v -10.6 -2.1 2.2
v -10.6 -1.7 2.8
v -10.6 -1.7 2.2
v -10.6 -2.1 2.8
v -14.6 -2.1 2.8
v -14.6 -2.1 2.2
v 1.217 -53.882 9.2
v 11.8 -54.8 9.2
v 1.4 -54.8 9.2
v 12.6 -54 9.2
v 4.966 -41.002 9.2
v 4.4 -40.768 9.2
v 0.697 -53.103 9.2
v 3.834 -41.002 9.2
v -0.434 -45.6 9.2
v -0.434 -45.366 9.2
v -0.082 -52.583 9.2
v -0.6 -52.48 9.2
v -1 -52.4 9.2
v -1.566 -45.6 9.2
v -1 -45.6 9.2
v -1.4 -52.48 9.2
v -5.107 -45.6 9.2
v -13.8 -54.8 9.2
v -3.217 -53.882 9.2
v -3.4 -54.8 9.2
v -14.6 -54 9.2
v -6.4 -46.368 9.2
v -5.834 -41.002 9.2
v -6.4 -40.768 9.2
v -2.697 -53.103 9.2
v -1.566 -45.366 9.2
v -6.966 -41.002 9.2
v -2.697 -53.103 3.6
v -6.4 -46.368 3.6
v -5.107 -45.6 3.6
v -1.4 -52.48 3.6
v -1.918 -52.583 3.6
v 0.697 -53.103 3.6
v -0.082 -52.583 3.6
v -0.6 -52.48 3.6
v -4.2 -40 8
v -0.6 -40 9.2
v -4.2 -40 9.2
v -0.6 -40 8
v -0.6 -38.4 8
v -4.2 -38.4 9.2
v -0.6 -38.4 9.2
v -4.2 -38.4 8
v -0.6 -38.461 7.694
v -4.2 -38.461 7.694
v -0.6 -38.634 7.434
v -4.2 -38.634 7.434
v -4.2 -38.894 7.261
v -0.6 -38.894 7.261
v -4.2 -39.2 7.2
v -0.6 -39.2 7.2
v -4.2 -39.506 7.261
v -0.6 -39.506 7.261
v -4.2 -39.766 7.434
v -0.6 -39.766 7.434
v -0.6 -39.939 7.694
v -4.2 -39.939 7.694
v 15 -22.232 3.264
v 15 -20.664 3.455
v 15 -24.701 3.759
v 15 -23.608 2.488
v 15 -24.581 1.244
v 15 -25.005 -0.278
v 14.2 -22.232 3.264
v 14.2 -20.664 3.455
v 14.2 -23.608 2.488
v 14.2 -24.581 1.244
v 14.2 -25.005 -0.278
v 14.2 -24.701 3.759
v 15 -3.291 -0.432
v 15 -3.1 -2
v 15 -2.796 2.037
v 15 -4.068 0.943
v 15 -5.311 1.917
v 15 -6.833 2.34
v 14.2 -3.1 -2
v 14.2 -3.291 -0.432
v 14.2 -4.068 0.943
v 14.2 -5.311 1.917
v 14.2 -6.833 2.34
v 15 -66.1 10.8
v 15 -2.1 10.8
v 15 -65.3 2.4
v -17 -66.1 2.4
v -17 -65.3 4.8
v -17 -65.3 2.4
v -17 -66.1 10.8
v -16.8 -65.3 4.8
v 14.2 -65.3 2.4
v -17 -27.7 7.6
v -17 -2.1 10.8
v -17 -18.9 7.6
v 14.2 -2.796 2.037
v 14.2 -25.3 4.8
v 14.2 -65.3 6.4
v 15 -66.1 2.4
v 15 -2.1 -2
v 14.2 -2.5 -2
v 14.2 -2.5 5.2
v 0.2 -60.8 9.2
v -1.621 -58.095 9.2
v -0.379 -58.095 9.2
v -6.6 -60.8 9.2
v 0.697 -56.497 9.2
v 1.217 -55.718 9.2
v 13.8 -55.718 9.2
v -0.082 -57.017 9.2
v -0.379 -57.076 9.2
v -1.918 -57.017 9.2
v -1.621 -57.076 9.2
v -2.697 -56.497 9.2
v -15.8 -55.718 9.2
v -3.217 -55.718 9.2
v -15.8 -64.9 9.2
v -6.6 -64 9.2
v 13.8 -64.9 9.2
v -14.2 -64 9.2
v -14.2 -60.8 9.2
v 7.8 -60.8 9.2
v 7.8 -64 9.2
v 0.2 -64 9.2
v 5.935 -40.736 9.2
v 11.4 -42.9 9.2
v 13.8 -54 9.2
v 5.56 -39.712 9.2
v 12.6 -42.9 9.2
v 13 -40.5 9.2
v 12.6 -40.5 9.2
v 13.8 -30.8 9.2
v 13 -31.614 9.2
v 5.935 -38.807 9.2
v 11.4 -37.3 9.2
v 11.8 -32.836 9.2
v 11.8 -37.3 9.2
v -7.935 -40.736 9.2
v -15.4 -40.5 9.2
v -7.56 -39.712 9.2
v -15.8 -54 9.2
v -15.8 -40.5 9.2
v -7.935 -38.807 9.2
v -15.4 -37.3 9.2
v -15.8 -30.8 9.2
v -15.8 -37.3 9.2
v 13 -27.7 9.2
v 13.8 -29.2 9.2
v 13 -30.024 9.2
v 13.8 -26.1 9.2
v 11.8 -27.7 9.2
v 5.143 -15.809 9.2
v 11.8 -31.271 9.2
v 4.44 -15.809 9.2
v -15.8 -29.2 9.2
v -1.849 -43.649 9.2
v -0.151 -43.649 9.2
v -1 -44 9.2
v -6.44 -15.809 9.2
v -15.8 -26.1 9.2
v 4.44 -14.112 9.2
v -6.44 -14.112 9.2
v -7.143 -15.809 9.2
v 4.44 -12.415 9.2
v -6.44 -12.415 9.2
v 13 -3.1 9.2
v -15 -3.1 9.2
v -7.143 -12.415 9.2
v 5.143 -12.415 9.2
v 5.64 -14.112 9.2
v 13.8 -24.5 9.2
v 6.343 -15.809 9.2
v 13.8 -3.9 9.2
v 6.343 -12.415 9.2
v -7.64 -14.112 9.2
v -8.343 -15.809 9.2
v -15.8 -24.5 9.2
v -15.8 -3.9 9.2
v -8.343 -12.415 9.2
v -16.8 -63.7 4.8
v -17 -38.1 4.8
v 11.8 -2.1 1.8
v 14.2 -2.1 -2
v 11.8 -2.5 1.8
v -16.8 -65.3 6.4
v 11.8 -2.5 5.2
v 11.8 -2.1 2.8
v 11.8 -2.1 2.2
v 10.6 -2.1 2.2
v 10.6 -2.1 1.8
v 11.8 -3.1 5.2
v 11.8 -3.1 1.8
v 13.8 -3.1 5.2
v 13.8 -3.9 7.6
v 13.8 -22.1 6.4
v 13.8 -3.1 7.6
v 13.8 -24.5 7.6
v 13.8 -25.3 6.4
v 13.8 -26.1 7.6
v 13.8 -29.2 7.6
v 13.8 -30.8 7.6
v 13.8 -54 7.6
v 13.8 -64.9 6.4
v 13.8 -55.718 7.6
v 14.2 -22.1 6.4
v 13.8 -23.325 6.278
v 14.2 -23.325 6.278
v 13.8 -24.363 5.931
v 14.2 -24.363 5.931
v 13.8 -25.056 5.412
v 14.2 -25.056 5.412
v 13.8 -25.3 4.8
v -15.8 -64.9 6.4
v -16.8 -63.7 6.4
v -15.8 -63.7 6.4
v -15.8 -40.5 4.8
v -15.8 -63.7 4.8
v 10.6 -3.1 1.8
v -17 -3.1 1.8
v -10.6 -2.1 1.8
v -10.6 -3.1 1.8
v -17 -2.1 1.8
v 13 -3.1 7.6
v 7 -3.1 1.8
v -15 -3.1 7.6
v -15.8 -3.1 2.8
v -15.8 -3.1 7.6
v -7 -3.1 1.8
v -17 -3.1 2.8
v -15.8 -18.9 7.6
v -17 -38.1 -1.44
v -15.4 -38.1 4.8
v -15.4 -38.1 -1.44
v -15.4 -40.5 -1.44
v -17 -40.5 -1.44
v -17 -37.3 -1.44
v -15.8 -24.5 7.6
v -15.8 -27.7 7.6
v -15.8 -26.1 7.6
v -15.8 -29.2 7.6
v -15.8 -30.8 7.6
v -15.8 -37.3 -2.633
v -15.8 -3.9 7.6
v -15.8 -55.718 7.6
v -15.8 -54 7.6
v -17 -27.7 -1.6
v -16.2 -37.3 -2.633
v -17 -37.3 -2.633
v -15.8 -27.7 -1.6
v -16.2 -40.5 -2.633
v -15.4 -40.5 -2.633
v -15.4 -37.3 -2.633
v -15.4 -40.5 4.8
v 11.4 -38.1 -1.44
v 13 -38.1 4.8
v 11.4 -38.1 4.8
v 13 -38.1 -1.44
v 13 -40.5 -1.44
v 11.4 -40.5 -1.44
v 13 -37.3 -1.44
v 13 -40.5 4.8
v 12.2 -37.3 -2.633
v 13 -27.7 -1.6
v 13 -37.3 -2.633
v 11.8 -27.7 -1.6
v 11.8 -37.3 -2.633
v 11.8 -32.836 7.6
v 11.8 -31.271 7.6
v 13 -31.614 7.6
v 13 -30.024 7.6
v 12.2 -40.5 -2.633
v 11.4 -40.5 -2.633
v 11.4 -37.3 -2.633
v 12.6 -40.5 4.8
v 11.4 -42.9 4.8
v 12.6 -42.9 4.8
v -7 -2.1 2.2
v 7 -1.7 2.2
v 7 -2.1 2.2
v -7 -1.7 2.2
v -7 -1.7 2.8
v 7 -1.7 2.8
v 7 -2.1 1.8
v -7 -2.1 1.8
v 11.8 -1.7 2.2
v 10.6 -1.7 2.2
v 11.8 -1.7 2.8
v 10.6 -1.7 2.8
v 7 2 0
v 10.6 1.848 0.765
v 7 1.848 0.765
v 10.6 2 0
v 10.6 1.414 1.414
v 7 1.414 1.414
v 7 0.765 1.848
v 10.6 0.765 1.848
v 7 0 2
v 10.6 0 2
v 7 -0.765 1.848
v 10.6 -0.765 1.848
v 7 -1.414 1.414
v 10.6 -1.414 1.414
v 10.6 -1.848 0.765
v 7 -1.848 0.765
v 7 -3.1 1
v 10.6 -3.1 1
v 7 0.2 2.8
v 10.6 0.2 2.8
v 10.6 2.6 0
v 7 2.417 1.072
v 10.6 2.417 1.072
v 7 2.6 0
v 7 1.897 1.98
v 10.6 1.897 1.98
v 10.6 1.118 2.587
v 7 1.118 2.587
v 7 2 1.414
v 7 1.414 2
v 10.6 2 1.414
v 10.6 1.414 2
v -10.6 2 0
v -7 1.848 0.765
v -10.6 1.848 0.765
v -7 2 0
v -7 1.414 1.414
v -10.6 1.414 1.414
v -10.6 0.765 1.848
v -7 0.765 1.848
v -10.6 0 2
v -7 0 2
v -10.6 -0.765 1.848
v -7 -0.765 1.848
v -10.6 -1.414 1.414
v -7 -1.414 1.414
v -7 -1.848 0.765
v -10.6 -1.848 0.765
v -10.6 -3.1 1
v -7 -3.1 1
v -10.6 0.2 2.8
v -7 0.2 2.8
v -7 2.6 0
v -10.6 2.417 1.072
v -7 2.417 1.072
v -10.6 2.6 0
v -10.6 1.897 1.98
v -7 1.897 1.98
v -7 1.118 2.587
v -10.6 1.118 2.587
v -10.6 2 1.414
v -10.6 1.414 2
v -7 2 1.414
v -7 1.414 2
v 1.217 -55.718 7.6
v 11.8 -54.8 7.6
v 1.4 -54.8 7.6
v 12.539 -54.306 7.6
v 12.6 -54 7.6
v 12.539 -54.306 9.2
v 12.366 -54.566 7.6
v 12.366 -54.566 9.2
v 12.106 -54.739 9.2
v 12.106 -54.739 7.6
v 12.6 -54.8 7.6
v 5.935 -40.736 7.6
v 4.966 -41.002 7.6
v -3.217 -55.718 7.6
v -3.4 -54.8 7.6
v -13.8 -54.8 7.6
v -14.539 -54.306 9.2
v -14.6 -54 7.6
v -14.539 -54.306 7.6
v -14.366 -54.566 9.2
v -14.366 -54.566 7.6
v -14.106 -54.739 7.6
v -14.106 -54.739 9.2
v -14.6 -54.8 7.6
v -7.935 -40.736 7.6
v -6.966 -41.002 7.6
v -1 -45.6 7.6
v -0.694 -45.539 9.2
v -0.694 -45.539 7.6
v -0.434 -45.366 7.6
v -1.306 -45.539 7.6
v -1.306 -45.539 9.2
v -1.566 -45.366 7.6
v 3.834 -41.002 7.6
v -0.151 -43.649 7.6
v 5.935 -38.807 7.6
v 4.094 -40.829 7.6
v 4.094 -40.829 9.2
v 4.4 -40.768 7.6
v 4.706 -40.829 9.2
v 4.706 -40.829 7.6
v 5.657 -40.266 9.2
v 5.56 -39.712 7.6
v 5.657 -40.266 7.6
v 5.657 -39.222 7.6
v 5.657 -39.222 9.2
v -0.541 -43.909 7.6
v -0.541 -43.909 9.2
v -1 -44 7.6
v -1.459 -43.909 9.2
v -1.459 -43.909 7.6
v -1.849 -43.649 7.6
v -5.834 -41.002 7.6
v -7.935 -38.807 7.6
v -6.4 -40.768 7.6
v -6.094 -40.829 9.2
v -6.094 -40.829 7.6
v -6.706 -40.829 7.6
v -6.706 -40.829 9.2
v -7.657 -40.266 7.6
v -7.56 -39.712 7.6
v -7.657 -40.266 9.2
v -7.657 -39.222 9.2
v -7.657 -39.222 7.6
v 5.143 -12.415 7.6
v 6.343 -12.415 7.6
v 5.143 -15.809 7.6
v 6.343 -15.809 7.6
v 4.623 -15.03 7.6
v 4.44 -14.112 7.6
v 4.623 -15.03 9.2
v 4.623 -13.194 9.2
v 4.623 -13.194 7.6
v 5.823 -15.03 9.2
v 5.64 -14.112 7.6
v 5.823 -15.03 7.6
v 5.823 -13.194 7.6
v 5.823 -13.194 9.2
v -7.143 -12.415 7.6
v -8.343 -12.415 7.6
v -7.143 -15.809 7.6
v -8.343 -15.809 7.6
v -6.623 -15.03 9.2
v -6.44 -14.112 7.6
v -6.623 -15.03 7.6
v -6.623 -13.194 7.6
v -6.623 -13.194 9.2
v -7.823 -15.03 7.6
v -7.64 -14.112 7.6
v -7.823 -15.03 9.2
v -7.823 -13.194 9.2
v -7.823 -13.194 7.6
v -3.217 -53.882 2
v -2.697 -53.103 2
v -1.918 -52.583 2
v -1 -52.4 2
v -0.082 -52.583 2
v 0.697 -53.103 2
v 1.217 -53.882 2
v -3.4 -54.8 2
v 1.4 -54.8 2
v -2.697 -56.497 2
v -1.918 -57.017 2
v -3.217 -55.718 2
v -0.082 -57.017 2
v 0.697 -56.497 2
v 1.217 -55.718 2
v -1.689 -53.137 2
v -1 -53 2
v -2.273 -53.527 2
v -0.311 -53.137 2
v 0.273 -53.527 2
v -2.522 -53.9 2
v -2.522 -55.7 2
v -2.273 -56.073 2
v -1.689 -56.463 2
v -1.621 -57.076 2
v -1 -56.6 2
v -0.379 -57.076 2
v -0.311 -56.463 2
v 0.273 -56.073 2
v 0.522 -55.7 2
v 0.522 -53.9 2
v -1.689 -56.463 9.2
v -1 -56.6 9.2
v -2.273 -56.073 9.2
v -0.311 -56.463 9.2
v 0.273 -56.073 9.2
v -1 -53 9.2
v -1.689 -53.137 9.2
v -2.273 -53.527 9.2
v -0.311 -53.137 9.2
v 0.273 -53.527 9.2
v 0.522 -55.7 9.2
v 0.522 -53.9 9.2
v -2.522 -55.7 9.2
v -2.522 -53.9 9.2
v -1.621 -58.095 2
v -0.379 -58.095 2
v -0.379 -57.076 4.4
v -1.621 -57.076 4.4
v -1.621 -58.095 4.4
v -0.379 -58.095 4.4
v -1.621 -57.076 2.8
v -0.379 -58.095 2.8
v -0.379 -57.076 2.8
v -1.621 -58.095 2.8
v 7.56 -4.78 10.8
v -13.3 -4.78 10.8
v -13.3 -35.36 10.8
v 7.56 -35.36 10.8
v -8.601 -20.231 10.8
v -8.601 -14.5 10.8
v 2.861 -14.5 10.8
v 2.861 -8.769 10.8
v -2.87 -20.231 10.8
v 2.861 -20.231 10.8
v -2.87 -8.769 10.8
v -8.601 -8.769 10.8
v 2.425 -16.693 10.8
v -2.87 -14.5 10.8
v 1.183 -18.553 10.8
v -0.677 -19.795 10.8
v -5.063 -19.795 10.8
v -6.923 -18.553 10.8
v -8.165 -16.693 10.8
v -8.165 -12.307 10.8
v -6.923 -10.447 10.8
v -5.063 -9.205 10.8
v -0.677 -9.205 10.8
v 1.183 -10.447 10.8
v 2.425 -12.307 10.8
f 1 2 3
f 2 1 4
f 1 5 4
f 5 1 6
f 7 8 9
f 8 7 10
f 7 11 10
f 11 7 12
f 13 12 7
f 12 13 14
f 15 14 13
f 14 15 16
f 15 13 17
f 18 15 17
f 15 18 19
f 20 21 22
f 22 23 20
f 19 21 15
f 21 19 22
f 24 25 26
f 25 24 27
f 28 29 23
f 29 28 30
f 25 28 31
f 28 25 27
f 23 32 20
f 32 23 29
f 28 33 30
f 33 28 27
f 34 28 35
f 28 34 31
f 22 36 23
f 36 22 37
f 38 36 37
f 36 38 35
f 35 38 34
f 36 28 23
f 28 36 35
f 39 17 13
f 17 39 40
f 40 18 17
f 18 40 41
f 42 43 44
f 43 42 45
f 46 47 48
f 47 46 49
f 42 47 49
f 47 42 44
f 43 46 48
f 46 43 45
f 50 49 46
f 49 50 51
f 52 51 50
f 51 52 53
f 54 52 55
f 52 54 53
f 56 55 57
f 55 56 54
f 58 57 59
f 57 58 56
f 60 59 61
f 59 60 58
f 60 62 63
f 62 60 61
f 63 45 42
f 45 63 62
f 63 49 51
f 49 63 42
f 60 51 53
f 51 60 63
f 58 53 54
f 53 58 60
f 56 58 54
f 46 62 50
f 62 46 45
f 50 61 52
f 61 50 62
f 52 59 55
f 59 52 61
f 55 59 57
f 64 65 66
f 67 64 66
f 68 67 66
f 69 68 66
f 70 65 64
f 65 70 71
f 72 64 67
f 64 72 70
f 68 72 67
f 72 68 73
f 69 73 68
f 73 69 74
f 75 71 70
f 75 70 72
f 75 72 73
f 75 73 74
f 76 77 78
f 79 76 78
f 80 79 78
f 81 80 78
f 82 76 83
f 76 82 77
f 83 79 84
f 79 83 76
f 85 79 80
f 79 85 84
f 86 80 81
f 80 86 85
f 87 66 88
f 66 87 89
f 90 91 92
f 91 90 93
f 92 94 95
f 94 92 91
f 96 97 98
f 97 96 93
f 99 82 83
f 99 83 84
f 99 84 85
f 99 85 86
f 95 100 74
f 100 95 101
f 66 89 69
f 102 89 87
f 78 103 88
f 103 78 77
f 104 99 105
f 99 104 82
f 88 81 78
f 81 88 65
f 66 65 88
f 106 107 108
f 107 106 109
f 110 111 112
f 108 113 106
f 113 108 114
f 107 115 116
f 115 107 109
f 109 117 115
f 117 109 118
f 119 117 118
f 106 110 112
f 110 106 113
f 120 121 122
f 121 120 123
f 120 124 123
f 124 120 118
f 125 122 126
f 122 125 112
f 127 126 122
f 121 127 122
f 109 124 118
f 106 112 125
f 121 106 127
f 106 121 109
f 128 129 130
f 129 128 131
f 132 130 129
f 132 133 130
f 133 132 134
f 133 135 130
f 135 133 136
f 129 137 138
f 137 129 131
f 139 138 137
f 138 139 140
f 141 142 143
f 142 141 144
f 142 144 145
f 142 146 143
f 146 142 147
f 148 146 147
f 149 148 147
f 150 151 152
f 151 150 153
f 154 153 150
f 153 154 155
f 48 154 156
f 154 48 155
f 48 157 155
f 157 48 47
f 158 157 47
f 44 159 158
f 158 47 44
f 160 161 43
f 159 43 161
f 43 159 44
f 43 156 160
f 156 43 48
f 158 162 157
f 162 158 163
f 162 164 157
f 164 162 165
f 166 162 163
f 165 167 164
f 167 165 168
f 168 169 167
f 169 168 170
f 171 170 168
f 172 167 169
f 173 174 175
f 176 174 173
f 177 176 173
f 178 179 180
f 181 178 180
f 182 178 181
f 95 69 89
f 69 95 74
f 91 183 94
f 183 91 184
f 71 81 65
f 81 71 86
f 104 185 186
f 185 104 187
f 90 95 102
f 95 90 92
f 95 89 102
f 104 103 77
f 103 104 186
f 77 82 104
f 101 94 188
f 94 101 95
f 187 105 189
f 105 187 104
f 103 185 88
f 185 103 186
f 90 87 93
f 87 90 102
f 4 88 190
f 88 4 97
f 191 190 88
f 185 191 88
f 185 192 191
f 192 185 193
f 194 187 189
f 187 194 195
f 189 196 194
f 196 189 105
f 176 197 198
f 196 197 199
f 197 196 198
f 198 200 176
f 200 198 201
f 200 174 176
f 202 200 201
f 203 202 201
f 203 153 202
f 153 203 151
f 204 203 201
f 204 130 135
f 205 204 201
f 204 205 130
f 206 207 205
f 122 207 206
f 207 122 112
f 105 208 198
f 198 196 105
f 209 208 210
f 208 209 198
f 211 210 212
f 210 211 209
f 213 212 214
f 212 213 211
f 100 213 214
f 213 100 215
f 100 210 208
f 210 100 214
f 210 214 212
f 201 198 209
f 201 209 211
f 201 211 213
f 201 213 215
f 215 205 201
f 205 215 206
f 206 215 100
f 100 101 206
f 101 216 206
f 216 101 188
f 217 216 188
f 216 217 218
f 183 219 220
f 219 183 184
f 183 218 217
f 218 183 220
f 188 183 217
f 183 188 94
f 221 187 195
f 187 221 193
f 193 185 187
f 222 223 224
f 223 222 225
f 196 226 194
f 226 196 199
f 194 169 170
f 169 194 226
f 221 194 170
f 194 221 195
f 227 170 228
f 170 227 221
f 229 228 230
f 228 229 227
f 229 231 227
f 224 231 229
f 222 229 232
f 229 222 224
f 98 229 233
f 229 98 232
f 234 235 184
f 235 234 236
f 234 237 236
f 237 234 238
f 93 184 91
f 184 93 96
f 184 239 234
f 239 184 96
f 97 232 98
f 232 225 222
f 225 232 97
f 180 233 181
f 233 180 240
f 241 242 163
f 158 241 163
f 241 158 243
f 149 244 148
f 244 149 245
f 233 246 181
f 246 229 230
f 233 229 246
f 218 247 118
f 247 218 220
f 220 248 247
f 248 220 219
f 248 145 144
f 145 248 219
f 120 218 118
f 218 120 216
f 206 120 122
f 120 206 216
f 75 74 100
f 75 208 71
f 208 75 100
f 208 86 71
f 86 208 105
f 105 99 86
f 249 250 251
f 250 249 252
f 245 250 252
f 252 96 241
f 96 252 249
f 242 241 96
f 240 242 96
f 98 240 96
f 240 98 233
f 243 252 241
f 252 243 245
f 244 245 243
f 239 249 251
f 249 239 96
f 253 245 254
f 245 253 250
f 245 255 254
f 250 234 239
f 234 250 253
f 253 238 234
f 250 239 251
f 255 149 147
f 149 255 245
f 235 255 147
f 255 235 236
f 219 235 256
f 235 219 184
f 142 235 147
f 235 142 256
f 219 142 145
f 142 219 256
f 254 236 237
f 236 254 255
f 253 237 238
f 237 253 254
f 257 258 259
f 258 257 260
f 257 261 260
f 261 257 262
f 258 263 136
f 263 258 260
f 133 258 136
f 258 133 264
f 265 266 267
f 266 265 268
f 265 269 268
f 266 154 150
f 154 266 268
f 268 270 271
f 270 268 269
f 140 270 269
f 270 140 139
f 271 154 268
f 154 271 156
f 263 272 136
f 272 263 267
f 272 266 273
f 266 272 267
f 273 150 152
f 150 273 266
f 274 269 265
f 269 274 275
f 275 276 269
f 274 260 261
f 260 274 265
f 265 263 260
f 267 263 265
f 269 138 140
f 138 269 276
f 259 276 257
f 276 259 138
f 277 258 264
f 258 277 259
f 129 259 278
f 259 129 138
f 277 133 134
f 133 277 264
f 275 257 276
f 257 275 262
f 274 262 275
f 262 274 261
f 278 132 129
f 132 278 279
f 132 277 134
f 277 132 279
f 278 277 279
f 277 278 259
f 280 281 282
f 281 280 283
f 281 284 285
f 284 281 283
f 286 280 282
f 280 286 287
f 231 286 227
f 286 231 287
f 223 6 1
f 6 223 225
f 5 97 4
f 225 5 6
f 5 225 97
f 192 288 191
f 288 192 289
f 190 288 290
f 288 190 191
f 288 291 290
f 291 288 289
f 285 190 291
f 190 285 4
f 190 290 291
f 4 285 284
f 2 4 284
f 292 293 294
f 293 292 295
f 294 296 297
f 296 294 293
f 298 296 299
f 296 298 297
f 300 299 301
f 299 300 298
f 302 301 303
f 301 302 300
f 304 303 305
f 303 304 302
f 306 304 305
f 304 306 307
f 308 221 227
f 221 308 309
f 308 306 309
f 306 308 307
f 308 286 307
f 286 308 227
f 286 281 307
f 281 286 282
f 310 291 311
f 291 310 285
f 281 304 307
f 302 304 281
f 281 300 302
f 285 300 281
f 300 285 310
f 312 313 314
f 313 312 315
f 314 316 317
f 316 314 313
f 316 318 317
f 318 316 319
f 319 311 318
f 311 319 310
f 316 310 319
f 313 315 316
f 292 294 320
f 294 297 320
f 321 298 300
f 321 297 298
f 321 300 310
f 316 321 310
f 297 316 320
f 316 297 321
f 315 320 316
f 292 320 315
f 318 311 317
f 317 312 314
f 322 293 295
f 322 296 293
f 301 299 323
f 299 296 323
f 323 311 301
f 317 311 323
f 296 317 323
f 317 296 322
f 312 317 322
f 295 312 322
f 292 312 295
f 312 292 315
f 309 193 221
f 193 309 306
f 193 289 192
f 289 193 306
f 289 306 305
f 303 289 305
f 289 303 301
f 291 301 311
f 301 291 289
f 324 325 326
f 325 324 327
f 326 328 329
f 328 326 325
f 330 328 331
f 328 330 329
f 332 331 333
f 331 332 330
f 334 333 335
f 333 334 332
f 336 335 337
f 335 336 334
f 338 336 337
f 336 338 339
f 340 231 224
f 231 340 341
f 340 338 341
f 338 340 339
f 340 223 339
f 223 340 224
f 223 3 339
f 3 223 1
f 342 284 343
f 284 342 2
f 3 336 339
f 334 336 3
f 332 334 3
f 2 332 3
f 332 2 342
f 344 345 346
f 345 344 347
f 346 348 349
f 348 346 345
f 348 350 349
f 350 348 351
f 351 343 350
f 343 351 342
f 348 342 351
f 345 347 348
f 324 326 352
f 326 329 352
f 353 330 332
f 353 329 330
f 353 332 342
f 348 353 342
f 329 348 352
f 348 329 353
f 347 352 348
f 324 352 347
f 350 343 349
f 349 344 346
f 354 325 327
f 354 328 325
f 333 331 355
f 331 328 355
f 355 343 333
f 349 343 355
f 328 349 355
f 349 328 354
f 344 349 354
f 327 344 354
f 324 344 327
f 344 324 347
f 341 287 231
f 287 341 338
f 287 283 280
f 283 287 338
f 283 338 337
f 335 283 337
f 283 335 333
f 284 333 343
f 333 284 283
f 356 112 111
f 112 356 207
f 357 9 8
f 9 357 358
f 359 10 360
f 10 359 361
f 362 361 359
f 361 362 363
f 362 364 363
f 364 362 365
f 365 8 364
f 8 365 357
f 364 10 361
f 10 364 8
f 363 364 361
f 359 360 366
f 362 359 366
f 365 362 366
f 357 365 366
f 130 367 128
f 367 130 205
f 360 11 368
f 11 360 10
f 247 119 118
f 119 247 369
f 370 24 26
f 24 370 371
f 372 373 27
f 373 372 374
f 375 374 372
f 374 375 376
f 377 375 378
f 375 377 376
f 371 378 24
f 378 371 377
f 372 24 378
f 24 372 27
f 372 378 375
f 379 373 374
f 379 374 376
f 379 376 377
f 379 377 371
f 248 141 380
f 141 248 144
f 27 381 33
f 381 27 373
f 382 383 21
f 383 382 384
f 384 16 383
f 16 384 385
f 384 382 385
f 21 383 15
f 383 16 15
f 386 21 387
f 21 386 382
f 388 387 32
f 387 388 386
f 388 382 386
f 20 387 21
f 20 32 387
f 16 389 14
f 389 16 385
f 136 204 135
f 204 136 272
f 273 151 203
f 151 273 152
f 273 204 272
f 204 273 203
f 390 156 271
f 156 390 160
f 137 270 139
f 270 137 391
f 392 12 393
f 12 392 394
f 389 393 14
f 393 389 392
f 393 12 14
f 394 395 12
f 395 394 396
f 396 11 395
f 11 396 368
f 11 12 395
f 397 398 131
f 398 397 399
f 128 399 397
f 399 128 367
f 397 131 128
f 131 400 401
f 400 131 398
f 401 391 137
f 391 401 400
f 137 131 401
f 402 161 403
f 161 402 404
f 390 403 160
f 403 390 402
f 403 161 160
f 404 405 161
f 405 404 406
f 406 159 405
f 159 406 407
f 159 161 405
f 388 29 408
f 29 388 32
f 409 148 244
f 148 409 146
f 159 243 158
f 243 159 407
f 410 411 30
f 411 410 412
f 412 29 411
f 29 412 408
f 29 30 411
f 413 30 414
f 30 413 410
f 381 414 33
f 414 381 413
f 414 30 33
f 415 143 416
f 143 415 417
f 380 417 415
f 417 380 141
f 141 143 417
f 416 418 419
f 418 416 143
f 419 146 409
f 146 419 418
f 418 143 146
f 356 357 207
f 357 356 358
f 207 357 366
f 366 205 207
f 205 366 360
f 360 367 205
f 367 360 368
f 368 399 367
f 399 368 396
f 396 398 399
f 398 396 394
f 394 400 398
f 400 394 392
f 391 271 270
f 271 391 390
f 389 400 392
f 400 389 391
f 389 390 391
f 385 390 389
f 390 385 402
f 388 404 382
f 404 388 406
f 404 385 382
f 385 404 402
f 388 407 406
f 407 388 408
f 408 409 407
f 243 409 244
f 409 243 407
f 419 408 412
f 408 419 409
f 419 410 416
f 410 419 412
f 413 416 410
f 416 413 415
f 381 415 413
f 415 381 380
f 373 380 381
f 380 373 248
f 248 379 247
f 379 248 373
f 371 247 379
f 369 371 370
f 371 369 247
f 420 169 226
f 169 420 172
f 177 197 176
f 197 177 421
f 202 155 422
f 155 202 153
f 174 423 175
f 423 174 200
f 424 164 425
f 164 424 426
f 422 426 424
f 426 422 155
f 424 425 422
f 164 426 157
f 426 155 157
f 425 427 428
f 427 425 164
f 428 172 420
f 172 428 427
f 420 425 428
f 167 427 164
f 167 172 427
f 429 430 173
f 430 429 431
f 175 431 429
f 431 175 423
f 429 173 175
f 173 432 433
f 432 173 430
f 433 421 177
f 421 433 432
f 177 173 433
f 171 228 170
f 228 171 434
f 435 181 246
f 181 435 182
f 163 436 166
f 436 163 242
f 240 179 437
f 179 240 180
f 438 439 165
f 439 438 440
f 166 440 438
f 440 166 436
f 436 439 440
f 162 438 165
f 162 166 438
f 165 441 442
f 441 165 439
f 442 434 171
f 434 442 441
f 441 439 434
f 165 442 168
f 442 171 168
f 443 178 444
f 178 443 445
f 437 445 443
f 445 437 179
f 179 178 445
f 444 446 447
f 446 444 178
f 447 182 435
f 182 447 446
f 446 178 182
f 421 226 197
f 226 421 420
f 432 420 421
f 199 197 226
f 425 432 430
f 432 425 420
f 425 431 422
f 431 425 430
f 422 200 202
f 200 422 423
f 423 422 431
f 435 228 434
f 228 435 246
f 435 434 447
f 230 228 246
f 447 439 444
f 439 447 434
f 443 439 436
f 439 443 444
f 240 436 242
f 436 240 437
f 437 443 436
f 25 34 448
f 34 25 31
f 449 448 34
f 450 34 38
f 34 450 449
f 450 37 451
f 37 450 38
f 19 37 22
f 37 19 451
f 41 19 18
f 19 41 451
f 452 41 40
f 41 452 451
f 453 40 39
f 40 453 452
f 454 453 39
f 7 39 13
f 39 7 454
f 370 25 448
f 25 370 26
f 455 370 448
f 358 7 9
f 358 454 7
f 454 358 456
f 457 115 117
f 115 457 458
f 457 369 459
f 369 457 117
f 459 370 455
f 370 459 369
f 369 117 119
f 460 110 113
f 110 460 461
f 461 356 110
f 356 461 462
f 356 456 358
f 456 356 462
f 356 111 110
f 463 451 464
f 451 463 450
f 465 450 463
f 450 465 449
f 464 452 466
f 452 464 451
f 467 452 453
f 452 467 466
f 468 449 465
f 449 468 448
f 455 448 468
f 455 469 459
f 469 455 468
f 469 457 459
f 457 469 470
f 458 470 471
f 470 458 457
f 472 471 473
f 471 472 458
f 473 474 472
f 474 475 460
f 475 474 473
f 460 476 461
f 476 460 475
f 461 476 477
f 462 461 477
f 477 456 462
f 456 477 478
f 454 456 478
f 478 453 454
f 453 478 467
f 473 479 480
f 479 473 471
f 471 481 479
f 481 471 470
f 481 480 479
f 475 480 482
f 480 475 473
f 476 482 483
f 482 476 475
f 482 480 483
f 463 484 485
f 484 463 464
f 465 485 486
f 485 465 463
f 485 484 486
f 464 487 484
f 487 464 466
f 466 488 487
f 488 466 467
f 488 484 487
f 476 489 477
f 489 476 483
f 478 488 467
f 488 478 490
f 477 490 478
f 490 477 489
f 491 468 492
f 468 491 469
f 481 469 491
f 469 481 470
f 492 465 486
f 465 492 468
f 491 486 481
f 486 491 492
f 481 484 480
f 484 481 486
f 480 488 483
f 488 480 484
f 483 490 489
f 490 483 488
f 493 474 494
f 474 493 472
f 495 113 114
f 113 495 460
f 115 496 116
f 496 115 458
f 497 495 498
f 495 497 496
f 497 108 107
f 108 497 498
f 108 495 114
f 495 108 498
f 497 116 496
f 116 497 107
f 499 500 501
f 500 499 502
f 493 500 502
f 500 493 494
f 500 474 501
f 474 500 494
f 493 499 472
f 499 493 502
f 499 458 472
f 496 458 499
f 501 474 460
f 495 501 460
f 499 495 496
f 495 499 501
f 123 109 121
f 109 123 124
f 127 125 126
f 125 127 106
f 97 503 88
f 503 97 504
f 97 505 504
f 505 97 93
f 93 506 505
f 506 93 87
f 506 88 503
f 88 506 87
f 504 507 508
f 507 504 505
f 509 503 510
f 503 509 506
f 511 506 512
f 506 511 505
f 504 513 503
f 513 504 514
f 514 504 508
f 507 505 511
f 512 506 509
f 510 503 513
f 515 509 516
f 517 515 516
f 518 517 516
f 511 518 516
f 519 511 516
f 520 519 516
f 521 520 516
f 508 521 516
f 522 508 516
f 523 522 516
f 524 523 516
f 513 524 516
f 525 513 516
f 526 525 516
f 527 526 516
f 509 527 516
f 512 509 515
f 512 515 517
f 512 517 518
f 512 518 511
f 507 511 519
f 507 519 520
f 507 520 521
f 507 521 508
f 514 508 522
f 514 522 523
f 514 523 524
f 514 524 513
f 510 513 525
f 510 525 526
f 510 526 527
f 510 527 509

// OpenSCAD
use <../lib.scad>
use <../p/4-4disc.scad>
use <../p/4-4ndis.scad>
use <s/4111s01.scad>
use <s/4112s01.scad>
function ldraw_lib__4111p02() = [
// 0 ~Electric Switch: Key Right with Green Signal Pattern
// 0 Name: 4111p02.dat
// 0 Author: Javier Orquera [kuramapika1]
// 0 !LDRAW_ORG Part UPDATE 2025-09
// 0 !LICENSE Licensed under CC BY 4.0 : see CAreadme.txt
// 
// 0 !HELP to put this part into a pressed-down state, rotate it 4.3 degrees
// 0 !HELP around the x-axis
// 
// 0 BFC CERTIFY CCW
  [0,"BFC","CERTIFY"],
  [0,"BFC","CCW"],
// 
// 0 !KEYWORDS Set 5081, Set 7860, switch, Train
// 
// 0 !HISTORY 2025-04-24 [kuramapika1] Adapted surfaces
// 0 !HISTORY 2025-09-11 [kuramapika1] Use of new subfile
// 0 !HISTORY 2025-09-29 [OrionP] Official Update 2025-09
// 
// 1 16 0 0 0 1 0 0 0 1 0 0 0 1 s\4111s01.dat
  [1,16,0,0,0,1,0,0,0,1,0,0,0,1, ldraw_lib__s__4111s01()],
// 1 16 0 0 0 -1 0 0 0 1 0 0 0 1 s\4112s01.dat
  [1,16,0,0,0,-1,0,0,0,1,0,0,0,1, ldraw_lib__s__4112s01()],
// 4 16 -42.5 -27 -5.25 -33.25 -27 -11.95 18.9 -27 -11.95 37.5 -27 -5.25
  [4,16,-42.5,-27,-5.25,-33.25,-27,-11.95,18.9,-27,-11.95,37.5,-27,-5.25],
// 4 16 -33.25 -27 -88.4 -33.25 -27 -11.95 -42.5 -27 -5.25 -42.5 -27 -165.25
  [4,16,-33.25,-27,-88.4,-33.25,-27,-11.95,-42.5,-27,-5.25,-42.5,-27,-165.25],
// 4 16 -33.25 -27 -88.4 -42.5 -27 -165.25 37.5 -27 -165.25 18.9 -27 -88.4
  [4,16,-33.25,-27,-88.4,-42.5,-27,-165.25,37.5,-27,-165.25,18.9,-27,-88.4],
// 4 16 37.5 -27 -165.25 37.5 -27 -5.25 18.9 -27 -11.95 18.9 -27 -88.4
  [4,16,37.5,-27,-165.25,37.5,-27,-5.25,18.9,-27,-11.95,18.9,-27,-88.4],
// 4 0 -33.25 -27 -88.4 -21.5034 -27 -50.5784 -21.5034 -27 -36.25 -33.25 -27 -11.95
  [4,0,-33.25,-27,-88.4,-21.5034,-27,-50.5784,-21.5034,-27,-36.25,-33.25,-27,-11.95],
// 4 0 7.1534 -27 -36.25 18.9 -27 -88.4 18.9 -27 -11.95 7.1534 -27 -21.9216
  [4,0,7.1534,-27,-36.25,18.9,-27,-88.4,18.9,-27,-11.95,7.1534,-27,-21.9216],
// 4 0 7.1534 -27 -50.5784 -7.175 -27 -50.5784 -33.25 -27 -88.4 18.9 -27 -88.4
  [4,0,7.1534,-27,-50.5784,-7.175,-27,-50.5784,-33.25,-27,-88.4,18.9,-27,-88.4],
// 4 0 18.9 -27 -11.95 -33.25 -27 -11.95 -21.5034 -27 -21.9216 -7.175 -27 -21.9216
  [4,0,18.9,-27,-11.95,-33.25,-27,-11.95,-21.5034,-27,-21.9216,-7.175,-27,-21.9216],
// 3 0 -21.5034 -27 -21.9216 -33.25 -27 -11.95 -21.5034 -27 -36.25
  [3,0,-21.5034,-27,-21.9216,-33.25,-27,-11.95,-21.5034,-27,-36.25],
// 3 0 -21.5034 -27 -50.5784 -33.25 -27 -88.4 -7.175 -27 -50.5784
  [3,0,-21.5034,-27,-50.5784,-33.25,-27,-88.4,-7.175,-27,-50.5784],
// 3 0 7.1534 -27 -50.5784 18.9 -27 -88.4 7.1534 -27 -36.25
  [3,0,7.1534,-27,-50.5784,18.9,-27,-88.4,7.1534,-27,-36.25],
// 3 0 7.1534 -27 -21.9216 18.9 -27 -11.95 -7.175 -27 -21.9216
  [3,0,7.1534,-27,-21.9216,18.9,-27,-11.95,-7.175,-27,-21.9216],
// 1 2 -7.175 -27 -36.25 14.3284 0 0 0 1 0 0 0 -14.3284 4-4disc.dat
  [1,2,-7.175,-27,-36.25,14.3284,0,0,0,1,0,0,0,-14.3284, ldraw_lib__4_4disc()],
// 1 0 -7.175 -27 -36.25 14.3284 0 0 0 1 0 0 0 -14.3284 4-4ndis.dat
  [1,0,-7.175,-27,-36.25,14.3284,0,0,0,1,0,0,0,-14.3284, ldraw_lib__4_4ndis()],
];
module ldraw_lib__4111p02(step=0, col=false, unit=2/5, alt=false, line=0.2, solid=!$preview)
    makepoly(ldraw_lib__4111p02(), step=step, col=col, unit=unit, alt=alt, line=line, solid=solid);
ldraw_lib__4111p02(line=0.2);
